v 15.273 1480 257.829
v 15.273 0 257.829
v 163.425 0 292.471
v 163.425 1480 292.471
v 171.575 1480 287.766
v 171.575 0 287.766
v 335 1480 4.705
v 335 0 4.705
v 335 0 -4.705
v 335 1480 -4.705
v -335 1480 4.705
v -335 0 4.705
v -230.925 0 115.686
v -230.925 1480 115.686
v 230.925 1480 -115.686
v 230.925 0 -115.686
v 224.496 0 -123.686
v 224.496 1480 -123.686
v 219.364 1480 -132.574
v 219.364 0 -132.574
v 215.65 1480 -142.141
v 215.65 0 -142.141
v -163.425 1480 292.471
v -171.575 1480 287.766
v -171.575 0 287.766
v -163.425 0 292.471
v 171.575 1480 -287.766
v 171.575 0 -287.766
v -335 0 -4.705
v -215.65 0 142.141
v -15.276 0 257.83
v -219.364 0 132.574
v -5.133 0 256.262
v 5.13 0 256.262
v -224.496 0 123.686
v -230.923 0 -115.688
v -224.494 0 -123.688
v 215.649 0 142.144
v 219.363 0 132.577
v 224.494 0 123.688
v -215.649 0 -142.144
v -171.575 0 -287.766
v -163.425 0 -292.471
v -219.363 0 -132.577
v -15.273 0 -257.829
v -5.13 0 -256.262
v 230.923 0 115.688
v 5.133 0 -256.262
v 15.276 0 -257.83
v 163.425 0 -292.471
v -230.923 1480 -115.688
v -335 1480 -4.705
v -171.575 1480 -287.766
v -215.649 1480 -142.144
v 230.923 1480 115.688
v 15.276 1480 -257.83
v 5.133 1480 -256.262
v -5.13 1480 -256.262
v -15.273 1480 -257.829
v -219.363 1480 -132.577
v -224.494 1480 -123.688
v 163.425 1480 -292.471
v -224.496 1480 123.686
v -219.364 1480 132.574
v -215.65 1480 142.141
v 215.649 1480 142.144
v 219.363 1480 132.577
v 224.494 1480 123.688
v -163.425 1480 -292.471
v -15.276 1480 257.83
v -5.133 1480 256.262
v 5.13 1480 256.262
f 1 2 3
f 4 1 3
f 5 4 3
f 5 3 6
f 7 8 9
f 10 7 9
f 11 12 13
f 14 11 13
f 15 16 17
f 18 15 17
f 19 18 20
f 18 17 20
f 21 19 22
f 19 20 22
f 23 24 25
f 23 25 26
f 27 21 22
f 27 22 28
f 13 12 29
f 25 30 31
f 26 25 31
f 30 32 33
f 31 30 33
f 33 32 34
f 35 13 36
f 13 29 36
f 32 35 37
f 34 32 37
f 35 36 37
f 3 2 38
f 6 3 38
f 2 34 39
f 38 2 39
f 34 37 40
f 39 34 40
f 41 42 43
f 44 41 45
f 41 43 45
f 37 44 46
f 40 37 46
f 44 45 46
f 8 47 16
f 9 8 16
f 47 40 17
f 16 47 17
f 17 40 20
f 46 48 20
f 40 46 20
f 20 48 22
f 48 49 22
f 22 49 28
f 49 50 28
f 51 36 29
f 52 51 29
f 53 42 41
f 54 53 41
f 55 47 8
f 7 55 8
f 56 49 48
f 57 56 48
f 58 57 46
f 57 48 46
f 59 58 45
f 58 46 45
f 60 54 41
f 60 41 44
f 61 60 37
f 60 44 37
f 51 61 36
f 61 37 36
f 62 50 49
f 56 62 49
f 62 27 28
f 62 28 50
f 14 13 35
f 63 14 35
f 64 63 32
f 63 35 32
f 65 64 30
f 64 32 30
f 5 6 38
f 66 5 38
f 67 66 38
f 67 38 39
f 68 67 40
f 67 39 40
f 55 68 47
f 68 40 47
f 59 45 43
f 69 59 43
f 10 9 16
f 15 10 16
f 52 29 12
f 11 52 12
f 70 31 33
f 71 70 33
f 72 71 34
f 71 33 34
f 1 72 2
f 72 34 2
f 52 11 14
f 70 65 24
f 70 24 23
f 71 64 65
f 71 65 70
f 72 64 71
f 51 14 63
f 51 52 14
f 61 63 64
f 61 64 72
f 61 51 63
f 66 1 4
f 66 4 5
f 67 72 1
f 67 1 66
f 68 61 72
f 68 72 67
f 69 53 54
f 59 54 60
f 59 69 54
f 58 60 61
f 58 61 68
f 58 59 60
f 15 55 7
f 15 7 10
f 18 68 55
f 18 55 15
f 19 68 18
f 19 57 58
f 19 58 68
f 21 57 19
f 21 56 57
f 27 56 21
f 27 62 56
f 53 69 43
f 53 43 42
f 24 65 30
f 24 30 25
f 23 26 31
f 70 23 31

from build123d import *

# Parameters (mm, degrees)
EXTRUDE_1_DEPTH = 1480


with BuildPart() as part:
    # 草图7 → 凸台-拉伸1 (new body)
    with BuildSketch(Plane(origin=(0, 0, 0), x_dir=(1, 0, 0), z_dir=(0, 1, 0))):
        with BuildLine():
            Line((-163.425407286, 292.470977468), (-171.574592714, 287.766043068))
            Line((-171.574592714, 287.766043068), (-215.64921864, 142.144339856))
            ThreePointArc((-215.64921864, 142.144339856), (-221.758129252, 128.033988921), (-230.922998757, 115.687898132))
            Line((-230.922998757, 115.687898132), (-335, 4.7049344))
            Line((-335, 4.7049344), (-335, -4.7049344))
            Line((-335, -4.7049344), (-230.92521864, -115.68553172))
            ThreePointArc((-230.92521864, -115.68553172), (-221.75975158, -128.031178968), (-215.650158071, -142.141234176))
            Line((-215.650158071, -142.141234176), (-171.574592714, -287.766043068))
            Line((-171.574592714, -287.766043068), (-163.425407286, -292.470977468))
            Line((-163.425407286, -292.470977468), (-15.276, -257.829871576))
            ThreePointArc((-15.276, -257.829871576), (-0.001622327, -256.065167889), (15.272840686, -257.829132308))
            Line((15.272840686, -257.829132308), (163.425407286, -292.470977468))
            Line((163.425407286, -292.470977468), (171.574592714, -287.766043068))
            Line((171.574592714, -287.766043068), (215.64921864, -142.144339856))
            ThreePointArc((215.64921864, -142.144339856), (221.758129252, -128.033988921), (230.922998757, -115.687898132))
            Line((230.922998757, -115.687898132), (335, -4.7049344))
            Line((335, -4.7049344), (335, 4.7049344))
            Line((335, 4.7049344), (230.92521864, 115.68553172))
            ThreePointArc((230.92521864, 115.68553172), (221.75975158, 128.031178968), (215.650158071, 142.141234176))
            Line((215.650158071, 142.141234176), (171.574592714, 287.766043068))
            Line((171.574592714, 287.766043068), (163.425407286, 292.470977468))
            Line((163.425407286, 292.470977468), (15.276, 257.829871576))
            ThreePointArc((15.276, 257.829871576), (0.001622327, 256.065167889), (-15.272840686, 257.829132308))
            Line((-15.272840686, 257.829132308), (-163.425407286, 292.470977468))
        make_face()
    extrude(amount=EXTRUDE_1_DEPTH)


solid = part.part
